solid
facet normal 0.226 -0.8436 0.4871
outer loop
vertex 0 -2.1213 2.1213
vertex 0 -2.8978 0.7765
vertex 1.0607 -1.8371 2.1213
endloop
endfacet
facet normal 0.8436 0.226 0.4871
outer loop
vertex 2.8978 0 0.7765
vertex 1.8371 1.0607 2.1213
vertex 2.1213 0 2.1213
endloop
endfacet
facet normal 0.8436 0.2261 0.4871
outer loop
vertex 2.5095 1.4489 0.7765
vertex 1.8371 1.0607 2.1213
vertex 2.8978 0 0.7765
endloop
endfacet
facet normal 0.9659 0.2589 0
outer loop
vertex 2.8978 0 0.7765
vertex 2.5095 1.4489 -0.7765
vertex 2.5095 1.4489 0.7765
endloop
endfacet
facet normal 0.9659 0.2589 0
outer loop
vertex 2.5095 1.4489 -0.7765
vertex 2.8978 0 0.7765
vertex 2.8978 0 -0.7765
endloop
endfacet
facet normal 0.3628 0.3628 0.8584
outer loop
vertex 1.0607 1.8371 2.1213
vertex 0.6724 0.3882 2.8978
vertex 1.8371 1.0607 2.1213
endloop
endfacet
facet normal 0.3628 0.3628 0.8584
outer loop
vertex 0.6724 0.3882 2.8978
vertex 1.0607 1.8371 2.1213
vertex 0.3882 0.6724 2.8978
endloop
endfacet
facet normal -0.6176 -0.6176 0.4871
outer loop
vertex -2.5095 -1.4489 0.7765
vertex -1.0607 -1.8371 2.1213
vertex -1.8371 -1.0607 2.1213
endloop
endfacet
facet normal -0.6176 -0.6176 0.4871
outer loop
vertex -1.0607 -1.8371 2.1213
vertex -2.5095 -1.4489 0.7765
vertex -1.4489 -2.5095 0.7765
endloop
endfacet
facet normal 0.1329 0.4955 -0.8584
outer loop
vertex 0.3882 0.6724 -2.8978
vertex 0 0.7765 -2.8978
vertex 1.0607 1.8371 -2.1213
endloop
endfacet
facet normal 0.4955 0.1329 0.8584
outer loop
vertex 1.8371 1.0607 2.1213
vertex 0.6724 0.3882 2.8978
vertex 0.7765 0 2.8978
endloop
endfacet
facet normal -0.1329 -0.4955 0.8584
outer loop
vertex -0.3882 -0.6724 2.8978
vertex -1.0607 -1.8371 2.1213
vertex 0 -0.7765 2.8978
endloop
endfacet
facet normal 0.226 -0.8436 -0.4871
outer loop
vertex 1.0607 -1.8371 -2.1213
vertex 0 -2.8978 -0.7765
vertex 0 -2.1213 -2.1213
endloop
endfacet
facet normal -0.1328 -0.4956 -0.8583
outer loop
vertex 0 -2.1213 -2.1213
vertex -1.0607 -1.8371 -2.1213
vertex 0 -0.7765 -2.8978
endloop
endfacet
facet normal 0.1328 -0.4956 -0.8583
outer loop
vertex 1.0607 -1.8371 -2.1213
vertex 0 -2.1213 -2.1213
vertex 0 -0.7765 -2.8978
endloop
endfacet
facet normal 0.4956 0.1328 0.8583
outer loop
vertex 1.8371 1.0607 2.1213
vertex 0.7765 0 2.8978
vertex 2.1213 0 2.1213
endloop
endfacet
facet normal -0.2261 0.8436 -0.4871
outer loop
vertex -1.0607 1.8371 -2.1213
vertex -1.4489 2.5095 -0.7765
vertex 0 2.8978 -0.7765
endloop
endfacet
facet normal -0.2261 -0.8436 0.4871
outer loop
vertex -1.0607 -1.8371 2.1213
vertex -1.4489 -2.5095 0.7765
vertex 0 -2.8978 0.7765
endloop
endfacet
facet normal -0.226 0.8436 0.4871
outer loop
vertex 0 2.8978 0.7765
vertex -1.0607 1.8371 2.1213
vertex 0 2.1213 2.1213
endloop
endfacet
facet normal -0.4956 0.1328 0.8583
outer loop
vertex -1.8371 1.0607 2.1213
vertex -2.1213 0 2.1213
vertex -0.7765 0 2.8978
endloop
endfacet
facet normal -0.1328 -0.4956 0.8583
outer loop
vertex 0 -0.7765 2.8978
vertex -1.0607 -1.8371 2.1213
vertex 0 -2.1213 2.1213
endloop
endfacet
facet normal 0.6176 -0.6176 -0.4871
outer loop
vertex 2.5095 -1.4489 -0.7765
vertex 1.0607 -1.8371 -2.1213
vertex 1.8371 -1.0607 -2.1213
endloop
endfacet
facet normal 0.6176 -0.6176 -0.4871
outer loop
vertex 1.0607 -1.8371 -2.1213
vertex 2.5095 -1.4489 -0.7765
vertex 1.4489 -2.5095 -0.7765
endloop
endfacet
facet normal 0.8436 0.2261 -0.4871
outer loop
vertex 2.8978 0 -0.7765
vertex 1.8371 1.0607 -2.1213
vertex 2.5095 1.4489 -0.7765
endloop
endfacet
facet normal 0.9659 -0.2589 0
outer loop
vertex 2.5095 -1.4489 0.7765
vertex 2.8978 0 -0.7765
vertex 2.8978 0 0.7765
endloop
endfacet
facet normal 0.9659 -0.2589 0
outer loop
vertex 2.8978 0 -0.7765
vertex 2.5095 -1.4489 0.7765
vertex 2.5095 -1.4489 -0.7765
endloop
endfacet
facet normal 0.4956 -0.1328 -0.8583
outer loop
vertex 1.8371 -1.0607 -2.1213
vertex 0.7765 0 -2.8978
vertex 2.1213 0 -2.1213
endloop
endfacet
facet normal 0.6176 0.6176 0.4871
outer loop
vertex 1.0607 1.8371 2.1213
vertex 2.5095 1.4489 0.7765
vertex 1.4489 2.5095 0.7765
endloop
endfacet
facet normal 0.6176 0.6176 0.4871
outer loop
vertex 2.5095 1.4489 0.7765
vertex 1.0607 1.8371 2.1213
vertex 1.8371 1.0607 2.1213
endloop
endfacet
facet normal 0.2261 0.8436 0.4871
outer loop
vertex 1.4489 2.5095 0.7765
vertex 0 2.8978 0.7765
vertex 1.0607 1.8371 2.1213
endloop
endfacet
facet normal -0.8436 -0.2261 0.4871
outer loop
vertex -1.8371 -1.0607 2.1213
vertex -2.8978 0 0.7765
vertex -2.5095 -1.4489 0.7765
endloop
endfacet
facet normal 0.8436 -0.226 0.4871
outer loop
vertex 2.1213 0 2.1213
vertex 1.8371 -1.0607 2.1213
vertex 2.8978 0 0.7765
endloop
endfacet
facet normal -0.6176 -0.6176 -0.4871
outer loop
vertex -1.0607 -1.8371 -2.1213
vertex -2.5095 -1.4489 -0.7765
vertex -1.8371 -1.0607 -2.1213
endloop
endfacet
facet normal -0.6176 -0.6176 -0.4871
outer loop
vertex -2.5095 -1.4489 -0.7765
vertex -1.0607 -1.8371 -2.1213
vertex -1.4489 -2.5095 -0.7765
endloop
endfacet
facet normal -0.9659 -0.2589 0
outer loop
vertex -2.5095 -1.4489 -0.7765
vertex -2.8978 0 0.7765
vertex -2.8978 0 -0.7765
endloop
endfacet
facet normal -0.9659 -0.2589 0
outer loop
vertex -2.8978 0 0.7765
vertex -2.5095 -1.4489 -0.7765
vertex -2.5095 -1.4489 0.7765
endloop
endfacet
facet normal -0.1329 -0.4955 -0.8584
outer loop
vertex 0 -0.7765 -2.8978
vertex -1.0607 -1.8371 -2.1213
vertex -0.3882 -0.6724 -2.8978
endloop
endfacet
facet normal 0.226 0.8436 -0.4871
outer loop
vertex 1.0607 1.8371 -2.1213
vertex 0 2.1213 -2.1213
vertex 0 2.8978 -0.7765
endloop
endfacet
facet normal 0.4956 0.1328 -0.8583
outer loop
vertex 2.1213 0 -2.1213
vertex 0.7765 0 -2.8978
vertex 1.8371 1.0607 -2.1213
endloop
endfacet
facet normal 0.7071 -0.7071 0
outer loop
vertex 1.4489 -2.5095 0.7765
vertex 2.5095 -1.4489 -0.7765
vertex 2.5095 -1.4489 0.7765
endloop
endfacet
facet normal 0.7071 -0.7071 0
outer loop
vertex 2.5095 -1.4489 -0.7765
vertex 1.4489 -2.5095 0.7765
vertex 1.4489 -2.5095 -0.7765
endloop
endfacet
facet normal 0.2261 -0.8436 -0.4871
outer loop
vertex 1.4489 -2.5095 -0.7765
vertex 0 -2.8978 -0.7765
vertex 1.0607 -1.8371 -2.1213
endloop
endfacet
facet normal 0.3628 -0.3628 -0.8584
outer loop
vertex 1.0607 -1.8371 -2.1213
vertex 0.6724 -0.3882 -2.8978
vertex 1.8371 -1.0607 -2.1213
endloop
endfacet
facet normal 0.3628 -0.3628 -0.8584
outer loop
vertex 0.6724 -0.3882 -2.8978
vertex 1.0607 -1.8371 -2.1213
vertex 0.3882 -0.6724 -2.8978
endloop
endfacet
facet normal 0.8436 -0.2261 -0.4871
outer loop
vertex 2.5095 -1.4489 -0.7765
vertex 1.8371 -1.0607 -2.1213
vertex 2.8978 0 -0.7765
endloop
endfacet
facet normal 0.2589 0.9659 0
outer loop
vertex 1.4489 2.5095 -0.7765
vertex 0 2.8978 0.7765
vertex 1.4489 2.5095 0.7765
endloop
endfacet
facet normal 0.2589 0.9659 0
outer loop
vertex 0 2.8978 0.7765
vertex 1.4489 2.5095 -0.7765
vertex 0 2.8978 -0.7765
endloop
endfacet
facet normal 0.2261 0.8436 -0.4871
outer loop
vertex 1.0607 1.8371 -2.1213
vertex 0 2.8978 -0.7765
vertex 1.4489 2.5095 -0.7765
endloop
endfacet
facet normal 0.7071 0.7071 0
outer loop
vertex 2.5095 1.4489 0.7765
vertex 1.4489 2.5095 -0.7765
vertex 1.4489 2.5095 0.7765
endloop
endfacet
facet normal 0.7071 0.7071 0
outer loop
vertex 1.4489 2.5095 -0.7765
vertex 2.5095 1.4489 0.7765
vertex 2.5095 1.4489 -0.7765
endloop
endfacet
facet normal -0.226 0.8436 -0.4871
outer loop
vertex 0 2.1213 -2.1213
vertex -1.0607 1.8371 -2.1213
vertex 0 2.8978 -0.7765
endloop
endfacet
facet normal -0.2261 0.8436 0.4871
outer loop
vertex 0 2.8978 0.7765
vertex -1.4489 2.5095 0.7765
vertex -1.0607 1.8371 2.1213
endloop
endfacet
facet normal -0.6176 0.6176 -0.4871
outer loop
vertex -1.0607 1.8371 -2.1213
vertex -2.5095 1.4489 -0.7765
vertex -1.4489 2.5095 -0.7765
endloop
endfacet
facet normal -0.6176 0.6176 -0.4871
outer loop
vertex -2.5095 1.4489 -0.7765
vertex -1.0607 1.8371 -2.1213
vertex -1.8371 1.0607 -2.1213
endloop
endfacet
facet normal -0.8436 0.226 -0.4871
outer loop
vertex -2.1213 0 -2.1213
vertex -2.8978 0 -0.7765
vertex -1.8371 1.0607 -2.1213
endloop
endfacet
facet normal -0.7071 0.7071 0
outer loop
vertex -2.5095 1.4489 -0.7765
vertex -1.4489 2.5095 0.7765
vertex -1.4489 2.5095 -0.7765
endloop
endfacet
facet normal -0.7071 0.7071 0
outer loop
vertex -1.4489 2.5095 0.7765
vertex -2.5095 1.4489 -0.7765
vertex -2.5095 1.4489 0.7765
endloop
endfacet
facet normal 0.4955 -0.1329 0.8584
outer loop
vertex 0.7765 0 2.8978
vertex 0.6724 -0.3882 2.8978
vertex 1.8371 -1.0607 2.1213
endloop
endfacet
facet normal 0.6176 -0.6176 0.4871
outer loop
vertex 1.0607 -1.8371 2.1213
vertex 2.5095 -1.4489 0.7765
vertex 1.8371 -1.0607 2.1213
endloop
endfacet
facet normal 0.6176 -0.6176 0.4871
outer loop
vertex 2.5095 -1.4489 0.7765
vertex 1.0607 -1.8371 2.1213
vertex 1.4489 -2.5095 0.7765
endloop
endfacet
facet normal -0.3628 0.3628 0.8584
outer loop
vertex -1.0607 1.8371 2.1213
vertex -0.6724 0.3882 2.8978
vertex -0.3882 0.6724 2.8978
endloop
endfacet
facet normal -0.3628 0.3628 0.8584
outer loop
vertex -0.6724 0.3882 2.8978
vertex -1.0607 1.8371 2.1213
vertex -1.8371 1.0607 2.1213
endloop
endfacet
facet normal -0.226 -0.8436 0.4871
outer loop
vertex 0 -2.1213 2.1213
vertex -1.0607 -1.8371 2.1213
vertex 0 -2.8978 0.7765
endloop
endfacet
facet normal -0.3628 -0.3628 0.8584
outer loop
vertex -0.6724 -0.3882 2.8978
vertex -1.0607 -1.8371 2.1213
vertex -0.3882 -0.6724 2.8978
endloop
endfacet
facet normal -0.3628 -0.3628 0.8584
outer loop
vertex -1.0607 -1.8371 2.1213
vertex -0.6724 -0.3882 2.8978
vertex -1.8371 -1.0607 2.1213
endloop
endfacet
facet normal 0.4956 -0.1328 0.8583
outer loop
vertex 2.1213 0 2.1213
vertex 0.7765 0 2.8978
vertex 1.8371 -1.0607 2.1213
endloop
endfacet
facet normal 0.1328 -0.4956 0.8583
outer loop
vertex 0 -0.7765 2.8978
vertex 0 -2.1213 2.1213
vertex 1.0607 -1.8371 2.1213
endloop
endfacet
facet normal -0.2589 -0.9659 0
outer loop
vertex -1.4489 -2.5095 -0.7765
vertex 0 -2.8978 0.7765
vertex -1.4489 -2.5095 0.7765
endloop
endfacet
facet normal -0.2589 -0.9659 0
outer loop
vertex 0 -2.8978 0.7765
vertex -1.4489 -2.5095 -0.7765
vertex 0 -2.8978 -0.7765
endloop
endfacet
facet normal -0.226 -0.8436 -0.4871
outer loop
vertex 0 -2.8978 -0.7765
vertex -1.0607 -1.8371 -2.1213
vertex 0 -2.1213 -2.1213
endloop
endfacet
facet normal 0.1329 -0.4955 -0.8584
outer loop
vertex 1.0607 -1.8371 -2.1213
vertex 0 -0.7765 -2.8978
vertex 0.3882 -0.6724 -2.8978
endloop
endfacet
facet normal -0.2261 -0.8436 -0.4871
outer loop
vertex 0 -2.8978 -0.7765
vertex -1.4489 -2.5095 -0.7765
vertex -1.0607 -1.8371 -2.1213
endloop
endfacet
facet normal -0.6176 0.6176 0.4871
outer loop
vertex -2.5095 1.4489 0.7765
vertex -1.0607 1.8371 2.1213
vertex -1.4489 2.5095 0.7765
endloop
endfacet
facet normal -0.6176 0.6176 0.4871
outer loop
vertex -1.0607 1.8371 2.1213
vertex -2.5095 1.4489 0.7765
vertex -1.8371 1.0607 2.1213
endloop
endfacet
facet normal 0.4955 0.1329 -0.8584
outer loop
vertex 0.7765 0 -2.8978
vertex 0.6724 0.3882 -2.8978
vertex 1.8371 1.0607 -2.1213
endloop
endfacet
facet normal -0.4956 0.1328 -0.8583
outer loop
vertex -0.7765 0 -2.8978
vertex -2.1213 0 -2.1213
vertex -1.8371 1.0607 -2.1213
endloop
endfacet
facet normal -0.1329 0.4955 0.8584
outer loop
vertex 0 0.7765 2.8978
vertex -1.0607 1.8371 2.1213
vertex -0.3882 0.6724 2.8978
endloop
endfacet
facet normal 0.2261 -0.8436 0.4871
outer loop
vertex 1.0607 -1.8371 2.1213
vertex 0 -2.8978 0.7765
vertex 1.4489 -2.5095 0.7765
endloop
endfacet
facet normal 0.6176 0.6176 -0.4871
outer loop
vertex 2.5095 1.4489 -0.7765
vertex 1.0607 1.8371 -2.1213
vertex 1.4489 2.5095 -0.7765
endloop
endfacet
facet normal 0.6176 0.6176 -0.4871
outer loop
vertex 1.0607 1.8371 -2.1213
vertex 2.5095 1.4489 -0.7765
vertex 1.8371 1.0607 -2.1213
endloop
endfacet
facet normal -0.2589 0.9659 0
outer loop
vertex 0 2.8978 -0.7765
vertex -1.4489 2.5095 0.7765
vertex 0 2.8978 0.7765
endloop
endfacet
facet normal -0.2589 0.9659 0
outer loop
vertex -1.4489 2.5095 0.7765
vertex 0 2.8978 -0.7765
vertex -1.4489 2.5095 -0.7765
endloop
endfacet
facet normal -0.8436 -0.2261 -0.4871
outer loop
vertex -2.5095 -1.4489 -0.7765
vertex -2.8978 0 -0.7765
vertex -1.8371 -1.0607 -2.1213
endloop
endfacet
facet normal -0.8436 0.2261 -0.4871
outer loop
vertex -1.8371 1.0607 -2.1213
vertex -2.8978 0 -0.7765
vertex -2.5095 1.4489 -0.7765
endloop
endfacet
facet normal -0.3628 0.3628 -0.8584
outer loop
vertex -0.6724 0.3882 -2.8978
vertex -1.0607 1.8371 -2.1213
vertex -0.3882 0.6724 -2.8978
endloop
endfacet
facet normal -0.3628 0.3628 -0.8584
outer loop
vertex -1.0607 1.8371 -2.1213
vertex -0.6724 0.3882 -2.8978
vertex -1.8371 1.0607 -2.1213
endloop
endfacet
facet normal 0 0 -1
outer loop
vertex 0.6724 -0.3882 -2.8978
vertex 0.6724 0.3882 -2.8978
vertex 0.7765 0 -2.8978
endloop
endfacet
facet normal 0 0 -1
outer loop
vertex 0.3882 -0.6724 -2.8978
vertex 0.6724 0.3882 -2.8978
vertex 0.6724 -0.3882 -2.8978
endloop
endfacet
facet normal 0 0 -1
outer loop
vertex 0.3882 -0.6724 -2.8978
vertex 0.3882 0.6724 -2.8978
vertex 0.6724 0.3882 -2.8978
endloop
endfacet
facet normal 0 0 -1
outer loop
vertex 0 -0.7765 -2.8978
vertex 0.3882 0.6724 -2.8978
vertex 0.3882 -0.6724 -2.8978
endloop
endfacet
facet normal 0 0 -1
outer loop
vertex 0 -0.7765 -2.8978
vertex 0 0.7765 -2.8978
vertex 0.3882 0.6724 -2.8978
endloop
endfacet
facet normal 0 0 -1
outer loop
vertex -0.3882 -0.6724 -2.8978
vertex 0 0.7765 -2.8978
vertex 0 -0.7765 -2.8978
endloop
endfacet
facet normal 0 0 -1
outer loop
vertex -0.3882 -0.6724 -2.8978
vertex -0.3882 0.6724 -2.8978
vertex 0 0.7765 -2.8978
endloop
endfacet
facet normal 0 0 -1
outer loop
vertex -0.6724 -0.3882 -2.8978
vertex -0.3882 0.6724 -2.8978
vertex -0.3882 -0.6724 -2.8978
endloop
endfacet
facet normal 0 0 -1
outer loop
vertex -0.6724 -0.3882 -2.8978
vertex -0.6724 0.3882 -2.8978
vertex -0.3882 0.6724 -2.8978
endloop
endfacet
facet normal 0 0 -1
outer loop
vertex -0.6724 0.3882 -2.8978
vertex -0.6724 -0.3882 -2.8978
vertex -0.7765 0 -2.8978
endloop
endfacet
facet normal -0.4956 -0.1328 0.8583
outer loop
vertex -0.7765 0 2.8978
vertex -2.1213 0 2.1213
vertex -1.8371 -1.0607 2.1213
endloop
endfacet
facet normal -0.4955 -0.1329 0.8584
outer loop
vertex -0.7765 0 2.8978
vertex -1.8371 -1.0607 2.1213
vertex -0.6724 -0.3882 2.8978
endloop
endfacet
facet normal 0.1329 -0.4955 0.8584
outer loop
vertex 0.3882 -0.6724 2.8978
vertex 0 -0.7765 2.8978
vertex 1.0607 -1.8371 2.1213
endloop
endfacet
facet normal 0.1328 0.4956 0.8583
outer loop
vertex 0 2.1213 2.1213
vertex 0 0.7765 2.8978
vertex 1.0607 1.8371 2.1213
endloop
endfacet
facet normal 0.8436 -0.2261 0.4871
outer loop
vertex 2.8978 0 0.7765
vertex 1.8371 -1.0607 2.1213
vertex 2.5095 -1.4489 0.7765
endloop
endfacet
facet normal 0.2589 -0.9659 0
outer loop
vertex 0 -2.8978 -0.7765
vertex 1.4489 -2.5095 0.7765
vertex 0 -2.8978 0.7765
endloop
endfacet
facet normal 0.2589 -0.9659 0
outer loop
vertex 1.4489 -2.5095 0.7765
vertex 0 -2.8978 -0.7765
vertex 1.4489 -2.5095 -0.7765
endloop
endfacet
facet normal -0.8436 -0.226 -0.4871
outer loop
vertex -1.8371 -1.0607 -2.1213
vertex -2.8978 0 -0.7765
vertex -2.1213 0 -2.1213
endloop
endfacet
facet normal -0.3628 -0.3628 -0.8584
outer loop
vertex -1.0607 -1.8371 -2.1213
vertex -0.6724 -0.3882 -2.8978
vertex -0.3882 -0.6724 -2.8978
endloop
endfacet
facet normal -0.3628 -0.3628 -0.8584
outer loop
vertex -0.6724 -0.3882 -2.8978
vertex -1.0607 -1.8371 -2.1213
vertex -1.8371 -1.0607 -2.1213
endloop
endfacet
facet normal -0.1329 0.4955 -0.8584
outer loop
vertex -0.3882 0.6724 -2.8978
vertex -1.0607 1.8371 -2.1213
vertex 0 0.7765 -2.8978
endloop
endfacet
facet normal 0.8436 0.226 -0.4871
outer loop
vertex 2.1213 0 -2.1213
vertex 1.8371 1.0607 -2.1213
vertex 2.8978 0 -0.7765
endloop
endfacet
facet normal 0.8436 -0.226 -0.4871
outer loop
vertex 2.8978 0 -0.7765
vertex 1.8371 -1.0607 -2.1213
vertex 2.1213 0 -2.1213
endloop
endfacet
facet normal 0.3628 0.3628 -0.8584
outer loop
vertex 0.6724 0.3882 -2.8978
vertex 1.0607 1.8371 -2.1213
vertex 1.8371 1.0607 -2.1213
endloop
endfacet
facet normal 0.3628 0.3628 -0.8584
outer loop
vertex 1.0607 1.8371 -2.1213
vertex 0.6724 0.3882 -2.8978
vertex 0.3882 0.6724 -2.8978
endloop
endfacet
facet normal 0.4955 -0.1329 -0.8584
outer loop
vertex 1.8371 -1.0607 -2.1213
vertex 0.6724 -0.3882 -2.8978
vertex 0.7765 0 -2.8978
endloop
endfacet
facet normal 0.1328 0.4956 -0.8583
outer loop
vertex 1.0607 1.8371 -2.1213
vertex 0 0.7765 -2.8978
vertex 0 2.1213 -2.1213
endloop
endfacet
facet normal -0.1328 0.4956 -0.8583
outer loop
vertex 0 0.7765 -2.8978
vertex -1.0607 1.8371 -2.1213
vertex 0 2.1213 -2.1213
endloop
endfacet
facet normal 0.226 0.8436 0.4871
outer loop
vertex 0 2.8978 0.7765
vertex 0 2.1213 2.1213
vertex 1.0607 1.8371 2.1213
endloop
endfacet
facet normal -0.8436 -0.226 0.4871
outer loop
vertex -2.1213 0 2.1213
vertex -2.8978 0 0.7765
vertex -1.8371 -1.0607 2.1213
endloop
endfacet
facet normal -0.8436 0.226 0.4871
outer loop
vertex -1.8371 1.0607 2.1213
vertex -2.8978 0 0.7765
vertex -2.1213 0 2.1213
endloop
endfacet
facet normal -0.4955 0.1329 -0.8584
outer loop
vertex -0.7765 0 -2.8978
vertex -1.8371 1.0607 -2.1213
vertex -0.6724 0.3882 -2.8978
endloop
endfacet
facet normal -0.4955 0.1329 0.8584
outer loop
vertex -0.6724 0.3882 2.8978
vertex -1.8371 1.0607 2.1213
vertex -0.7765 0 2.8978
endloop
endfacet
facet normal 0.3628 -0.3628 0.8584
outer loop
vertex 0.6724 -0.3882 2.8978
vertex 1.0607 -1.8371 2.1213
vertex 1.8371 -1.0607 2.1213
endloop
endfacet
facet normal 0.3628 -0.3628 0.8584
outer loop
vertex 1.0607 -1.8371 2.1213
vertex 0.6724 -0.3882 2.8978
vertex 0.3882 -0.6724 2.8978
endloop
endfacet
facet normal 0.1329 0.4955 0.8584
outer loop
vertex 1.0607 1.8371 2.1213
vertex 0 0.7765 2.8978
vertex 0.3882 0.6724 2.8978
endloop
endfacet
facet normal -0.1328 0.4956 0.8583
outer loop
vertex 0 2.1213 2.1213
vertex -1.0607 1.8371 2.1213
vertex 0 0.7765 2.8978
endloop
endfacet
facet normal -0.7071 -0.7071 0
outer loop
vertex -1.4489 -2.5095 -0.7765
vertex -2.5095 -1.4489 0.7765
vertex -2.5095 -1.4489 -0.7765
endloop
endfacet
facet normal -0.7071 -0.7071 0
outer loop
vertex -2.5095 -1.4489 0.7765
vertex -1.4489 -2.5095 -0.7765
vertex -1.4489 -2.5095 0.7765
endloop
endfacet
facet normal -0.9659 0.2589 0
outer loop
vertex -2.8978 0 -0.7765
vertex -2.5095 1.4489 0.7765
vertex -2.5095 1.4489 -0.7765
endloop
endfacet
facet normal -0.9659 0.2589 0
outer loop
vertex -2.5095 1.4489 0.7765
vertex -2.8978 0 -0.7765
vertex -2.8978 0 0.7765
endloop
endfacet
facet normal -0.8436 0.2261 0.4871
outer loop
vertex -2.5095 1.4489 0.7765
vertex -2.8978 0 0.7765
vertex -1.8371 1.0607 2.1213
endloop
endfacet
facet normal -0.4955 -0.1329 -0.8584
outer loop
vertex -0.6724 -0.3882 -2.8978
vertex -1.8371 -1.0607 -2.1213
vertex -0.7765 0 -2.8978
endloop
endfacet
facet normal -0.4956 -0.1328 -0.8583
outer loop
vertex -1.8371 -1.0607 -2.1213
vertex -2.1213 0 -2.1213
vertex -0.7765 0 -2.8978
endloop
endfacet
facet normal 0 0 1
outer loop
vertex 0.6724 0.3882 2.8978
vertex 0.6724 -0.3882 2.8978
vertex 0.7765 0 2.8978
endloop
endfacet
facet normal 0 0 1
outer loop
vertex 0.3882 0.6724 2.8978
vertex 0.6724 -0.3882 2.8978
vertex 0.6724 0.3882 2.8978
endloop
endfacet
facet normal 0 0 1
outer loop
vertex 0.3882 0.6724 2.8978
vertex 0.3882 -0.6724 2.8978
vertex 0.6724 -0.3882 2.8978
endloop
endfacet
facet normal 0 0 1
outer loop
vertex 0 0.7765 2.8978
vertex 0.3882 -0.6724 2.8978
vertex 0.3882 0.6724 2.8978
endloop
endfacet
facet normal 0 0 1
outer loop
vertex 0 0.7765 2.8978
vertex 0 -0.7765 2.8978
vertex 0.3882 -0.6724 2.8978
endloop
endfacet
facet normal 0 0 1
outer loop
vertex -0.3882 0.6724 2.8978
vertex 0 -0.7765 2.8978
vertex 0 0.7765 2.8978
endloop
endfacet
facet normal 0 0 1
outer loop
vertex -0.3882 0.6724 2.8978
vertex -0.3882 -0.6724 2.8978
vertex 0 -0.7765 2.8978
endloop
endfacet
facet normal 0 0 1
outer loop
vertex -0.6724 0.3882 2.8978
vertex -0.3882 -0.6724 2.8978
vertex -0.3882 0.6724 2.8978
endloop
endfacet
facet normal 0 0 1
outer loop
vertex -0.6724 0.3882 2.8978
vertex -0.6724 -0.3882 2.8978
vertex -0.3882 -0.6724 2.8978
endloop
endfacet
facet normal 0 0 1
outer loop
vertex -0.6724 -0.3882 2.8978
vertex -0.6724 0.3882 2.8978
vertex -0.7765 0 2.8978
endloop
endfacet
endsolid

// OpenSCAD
sphere(r=3, $fn=12);

minkowski()
{
linear_extrude(height=75)
import("star.dxf");

sphere(r=3, $fn=12);
}
